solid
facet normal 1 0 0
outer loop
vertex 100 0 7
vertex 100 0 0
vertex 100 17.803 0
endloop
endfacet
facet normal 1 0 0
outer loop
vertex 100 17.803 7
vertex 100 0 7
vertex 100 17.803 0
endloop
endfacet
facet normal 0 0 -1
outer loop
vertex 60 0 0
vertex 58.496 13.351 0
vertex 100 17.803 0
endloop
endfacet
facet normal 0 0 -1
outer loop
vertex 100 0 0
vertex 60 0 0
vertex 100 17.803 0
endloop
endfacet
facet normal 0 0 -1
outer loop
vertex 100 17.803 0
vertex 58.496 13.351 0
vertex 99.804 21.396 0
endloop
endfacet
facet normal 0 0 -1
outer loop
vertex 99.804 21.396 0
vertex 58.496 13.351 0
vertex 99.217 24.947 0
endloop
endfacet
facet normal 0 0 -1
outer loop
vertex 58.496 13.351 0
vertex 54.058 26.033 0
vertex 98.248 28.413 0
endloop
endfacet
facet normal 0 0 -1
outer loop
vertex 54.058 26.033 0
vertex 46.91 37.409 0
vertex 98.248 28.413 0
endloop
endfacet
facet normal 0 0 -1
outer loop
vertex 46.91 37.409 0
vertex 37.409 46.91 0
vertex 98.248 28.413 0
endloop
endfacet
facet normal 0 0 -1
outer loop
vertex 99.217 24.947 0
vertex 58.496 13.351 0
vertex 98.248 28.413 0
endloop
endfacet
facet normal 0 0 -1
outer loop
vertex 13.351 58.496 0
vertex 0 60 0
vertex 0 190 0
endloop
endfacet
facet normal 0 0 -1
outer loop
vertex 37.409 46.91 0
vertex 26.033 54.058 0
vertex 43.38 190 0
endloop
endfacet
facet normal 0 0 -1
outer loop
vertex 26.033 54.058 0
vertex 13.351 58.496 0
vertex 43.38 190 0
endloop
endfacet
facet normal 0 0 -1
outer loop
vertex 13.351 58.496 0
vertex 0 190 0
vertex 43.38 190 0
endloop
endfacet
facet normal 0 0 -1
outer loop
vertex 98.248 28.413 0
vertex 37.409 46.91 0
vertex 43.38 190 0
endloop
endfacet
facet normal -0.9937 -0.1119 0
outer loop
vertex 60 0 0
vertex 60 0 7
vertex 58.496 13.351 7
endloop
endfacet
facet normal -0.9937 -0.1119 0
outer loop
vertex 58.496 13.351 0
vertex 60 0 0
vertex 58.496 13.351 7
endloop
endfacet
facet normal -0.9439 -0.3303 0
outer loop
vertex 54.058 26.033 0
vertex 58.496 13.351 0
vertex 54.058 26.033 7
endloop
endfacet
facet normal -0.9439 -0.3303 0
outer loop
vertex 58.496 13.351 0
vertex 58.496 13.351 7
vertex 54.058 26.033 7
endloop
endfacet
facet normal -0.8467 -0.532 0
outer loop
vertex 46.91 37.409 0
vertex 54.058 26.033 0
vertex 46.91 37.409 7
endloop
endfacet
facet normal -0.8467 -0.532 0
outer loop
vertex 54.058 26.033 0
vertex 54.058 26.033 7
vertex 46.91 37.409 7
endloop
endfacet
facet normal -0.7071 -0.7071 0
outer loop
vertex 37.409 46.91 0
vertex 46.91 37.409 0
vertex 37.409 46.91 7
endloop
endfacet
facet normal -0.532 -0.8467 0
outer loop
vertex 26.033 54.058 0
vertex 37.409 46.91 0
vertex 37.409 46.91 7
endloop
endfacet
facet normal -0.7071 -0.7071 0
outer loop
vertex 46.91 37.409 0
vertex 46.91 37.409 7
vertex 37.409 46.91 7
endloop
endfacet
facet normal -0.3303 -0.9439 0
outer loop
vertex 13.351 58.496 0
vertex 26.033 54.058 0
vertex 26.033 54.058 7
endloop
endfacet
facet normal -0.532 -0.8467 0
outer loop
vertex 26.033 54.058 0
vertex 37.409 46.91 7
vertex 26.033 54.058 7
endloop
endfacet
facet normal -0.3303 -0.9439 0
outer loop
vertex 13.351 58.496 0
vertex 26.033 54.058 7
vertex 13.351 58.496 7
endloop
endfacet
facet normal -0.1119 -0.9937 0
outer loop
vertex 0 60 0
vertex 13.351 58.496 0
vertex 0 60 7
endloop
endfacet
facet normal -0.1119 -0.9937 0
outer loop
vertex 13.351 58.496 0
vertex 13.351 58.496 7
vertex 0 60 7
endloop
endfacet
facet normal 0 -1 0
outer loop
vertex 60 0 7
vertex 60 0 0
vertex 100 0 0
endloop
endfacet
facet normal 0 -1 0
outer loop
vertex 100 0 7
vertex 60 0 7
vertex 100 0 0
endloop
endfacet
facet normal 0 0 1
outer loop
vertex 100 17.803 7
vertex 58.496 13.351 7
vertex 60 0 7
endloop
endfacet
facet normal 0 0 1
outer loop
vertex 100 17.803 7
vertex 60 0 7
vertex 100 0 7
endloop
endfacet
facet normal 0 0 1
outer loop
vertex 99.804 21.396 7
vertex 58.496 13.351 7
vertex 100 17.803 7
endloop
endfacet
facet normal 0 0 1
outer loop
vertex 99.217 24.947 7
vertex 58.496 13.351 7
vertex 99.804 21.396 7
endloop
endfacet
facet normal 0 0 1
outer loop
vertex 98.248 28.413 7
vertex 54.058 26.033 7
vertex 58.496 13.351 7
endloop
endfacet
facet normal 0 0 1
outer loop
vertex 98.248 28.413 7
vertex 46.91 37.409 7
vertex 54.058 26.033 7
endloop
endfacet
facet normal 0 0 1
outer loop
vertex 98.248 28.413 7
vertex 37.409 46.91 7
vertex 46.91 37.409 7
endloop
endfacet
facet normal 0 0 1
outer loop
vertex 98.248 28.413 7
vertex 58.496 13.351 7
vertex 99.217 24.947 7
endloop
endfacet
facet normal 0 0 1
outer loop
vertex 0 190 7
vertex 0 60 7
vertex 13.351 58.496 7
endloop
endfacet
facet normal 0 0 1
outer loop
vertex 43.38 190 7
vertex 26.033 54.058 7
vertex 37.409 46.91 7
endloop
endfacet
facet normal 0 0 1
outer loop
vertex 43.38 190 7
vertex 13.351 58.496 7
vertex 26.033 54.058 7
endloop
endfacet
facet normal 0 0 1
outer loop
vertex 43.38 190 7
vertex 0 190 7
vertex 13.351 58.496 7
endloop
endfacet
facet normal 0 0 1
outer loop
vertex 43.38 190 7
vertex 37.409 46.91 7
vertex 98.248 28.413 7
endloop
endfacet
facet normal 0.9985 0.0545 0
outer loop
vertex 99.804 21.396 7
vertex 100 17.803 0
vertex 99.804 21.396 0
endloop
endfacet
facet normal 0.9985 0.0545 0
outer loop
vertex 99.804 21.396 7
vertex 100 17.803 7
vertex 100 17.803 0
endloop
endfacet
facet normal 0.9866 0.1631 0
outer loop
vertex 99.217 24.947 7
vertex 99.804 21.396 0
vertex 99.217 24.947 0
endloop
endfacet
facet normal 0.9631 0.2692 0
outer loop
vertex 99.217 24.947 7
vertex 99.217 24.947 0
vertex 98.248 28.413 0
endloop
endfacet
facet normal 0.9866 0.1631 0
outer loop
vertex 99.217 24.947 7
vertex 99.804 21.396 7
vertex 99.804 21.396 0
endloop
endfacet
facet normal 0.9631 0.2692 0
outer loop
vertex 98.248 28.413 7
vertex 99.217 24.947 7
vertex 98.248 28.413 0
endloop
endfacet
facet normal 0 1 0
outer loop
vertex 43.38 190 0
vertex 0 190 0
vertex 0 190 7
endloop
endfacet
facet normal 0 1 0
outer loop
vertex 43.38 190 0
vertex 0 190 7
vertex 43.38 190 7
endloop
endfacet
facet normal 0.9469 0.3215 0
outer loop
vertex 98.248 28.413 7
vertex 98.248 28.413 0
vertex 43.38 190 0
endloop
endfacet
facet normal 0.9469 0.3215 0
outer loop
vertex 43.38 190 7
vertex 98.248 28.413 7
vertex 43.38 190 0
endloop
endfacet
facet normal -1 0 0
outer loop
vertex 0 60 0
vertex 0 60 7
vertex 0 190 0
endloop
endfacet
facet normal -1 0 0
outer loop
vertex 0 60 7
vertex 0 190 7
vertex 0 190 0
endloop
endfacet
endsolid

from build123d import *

# Parameters (mm, degrees)
BOSS_EXTRUDE1_DEPTH = 7
FILLET1_R           = 33
SKETCH2_R           = 60
CUT_EXTRUDE1_DEPTH  = 259.610511066
SKETCH3_W           = 181.044086137
SKETCH3_H           = 480.78858802
CUT_EXTRUDE2_DEPTH  = 259.610511066
SKETCH4_W           = 169.768954509
SKETCH4_H           = 49.097500459
CUT_EXTRUDE3_DEPTH  = 215.823183106


with BuildPart() as part:
    # Sketch1 → Boss-Extrude1 (new body)
    with BuildSketch(Plane.XY):
        with BuildLine():
            Line((-100, 0), (100, 0))
            Line((100, 0), (100, 23.252721757))
            Line((100, 23.252721757), (26.948185903, 238.391267529))
            Line((26.948185903, 238.391267529), (24.948185903, 238.391267529))
            ThreePointArc((24.948185903, 238.391267529), (0, 215), (-24.948185903, 238.391267529))
            Line((-24.948185903, 238.391267529), (-26.948185903, 238.391267529))
            Line((-26.948185903, 238.391267529), (-100, 23.252721757))
            Line((-100, 23.252721757), (-100, 0))
        make_face()
    extrude(amount=BOSS_EXTRUDE1_DEPTH)

    # Fillet1
    fillet1_edges = [part.edges().sort_by_distance(p)[0] for p in [
        (-100, 23.252721757, 3.5),
        (100, 23.252721757, 3.5),
    ]]
    fillet(fillet1_edges, radius=FILLET1_R)

    # Sketch2 → Cut-Extrude1 (cut, through all)
    with BuildSketch(Plane.XY.offset(7)):
        Circle(SKETCH2_R)
    extrude(amount=-CUT_EXTRUDE1_DEPTH, mode=Mode.SUBTRACT)

    # Sketch3 → Cut-Extrude2 (cut, through all)
    with BuildSketch(Plane(origin=(0, 0, 0), x_dir=(0, 0, -1), z_dir=(1, 0, 0))):
        with Locations((-2.723537344, 108.130535203)):
            Rectangle(SKETCH3_W, SKETCH3_H)
    extrude(amount=-CUT_EXTRUDE2_DEPTH, mode=Mode.SUBTRACT)

    # Sketch4 → Cut-Extrude3 (cut, through all)
    with BuildSketch(Plane(origin=(0, 190, 0), x_dir=(1, 0, 0), z_dir=(0, 1, 0))):
        with Locations((45.695998337, 2.995854363)):
            Rectangle(SKETCH4_W, SKETCH4_H)
    extrude(amount=CUT_EXTRUDE3_DEPTH, mode=Mode.SUBTRACT)


solid = part.part
